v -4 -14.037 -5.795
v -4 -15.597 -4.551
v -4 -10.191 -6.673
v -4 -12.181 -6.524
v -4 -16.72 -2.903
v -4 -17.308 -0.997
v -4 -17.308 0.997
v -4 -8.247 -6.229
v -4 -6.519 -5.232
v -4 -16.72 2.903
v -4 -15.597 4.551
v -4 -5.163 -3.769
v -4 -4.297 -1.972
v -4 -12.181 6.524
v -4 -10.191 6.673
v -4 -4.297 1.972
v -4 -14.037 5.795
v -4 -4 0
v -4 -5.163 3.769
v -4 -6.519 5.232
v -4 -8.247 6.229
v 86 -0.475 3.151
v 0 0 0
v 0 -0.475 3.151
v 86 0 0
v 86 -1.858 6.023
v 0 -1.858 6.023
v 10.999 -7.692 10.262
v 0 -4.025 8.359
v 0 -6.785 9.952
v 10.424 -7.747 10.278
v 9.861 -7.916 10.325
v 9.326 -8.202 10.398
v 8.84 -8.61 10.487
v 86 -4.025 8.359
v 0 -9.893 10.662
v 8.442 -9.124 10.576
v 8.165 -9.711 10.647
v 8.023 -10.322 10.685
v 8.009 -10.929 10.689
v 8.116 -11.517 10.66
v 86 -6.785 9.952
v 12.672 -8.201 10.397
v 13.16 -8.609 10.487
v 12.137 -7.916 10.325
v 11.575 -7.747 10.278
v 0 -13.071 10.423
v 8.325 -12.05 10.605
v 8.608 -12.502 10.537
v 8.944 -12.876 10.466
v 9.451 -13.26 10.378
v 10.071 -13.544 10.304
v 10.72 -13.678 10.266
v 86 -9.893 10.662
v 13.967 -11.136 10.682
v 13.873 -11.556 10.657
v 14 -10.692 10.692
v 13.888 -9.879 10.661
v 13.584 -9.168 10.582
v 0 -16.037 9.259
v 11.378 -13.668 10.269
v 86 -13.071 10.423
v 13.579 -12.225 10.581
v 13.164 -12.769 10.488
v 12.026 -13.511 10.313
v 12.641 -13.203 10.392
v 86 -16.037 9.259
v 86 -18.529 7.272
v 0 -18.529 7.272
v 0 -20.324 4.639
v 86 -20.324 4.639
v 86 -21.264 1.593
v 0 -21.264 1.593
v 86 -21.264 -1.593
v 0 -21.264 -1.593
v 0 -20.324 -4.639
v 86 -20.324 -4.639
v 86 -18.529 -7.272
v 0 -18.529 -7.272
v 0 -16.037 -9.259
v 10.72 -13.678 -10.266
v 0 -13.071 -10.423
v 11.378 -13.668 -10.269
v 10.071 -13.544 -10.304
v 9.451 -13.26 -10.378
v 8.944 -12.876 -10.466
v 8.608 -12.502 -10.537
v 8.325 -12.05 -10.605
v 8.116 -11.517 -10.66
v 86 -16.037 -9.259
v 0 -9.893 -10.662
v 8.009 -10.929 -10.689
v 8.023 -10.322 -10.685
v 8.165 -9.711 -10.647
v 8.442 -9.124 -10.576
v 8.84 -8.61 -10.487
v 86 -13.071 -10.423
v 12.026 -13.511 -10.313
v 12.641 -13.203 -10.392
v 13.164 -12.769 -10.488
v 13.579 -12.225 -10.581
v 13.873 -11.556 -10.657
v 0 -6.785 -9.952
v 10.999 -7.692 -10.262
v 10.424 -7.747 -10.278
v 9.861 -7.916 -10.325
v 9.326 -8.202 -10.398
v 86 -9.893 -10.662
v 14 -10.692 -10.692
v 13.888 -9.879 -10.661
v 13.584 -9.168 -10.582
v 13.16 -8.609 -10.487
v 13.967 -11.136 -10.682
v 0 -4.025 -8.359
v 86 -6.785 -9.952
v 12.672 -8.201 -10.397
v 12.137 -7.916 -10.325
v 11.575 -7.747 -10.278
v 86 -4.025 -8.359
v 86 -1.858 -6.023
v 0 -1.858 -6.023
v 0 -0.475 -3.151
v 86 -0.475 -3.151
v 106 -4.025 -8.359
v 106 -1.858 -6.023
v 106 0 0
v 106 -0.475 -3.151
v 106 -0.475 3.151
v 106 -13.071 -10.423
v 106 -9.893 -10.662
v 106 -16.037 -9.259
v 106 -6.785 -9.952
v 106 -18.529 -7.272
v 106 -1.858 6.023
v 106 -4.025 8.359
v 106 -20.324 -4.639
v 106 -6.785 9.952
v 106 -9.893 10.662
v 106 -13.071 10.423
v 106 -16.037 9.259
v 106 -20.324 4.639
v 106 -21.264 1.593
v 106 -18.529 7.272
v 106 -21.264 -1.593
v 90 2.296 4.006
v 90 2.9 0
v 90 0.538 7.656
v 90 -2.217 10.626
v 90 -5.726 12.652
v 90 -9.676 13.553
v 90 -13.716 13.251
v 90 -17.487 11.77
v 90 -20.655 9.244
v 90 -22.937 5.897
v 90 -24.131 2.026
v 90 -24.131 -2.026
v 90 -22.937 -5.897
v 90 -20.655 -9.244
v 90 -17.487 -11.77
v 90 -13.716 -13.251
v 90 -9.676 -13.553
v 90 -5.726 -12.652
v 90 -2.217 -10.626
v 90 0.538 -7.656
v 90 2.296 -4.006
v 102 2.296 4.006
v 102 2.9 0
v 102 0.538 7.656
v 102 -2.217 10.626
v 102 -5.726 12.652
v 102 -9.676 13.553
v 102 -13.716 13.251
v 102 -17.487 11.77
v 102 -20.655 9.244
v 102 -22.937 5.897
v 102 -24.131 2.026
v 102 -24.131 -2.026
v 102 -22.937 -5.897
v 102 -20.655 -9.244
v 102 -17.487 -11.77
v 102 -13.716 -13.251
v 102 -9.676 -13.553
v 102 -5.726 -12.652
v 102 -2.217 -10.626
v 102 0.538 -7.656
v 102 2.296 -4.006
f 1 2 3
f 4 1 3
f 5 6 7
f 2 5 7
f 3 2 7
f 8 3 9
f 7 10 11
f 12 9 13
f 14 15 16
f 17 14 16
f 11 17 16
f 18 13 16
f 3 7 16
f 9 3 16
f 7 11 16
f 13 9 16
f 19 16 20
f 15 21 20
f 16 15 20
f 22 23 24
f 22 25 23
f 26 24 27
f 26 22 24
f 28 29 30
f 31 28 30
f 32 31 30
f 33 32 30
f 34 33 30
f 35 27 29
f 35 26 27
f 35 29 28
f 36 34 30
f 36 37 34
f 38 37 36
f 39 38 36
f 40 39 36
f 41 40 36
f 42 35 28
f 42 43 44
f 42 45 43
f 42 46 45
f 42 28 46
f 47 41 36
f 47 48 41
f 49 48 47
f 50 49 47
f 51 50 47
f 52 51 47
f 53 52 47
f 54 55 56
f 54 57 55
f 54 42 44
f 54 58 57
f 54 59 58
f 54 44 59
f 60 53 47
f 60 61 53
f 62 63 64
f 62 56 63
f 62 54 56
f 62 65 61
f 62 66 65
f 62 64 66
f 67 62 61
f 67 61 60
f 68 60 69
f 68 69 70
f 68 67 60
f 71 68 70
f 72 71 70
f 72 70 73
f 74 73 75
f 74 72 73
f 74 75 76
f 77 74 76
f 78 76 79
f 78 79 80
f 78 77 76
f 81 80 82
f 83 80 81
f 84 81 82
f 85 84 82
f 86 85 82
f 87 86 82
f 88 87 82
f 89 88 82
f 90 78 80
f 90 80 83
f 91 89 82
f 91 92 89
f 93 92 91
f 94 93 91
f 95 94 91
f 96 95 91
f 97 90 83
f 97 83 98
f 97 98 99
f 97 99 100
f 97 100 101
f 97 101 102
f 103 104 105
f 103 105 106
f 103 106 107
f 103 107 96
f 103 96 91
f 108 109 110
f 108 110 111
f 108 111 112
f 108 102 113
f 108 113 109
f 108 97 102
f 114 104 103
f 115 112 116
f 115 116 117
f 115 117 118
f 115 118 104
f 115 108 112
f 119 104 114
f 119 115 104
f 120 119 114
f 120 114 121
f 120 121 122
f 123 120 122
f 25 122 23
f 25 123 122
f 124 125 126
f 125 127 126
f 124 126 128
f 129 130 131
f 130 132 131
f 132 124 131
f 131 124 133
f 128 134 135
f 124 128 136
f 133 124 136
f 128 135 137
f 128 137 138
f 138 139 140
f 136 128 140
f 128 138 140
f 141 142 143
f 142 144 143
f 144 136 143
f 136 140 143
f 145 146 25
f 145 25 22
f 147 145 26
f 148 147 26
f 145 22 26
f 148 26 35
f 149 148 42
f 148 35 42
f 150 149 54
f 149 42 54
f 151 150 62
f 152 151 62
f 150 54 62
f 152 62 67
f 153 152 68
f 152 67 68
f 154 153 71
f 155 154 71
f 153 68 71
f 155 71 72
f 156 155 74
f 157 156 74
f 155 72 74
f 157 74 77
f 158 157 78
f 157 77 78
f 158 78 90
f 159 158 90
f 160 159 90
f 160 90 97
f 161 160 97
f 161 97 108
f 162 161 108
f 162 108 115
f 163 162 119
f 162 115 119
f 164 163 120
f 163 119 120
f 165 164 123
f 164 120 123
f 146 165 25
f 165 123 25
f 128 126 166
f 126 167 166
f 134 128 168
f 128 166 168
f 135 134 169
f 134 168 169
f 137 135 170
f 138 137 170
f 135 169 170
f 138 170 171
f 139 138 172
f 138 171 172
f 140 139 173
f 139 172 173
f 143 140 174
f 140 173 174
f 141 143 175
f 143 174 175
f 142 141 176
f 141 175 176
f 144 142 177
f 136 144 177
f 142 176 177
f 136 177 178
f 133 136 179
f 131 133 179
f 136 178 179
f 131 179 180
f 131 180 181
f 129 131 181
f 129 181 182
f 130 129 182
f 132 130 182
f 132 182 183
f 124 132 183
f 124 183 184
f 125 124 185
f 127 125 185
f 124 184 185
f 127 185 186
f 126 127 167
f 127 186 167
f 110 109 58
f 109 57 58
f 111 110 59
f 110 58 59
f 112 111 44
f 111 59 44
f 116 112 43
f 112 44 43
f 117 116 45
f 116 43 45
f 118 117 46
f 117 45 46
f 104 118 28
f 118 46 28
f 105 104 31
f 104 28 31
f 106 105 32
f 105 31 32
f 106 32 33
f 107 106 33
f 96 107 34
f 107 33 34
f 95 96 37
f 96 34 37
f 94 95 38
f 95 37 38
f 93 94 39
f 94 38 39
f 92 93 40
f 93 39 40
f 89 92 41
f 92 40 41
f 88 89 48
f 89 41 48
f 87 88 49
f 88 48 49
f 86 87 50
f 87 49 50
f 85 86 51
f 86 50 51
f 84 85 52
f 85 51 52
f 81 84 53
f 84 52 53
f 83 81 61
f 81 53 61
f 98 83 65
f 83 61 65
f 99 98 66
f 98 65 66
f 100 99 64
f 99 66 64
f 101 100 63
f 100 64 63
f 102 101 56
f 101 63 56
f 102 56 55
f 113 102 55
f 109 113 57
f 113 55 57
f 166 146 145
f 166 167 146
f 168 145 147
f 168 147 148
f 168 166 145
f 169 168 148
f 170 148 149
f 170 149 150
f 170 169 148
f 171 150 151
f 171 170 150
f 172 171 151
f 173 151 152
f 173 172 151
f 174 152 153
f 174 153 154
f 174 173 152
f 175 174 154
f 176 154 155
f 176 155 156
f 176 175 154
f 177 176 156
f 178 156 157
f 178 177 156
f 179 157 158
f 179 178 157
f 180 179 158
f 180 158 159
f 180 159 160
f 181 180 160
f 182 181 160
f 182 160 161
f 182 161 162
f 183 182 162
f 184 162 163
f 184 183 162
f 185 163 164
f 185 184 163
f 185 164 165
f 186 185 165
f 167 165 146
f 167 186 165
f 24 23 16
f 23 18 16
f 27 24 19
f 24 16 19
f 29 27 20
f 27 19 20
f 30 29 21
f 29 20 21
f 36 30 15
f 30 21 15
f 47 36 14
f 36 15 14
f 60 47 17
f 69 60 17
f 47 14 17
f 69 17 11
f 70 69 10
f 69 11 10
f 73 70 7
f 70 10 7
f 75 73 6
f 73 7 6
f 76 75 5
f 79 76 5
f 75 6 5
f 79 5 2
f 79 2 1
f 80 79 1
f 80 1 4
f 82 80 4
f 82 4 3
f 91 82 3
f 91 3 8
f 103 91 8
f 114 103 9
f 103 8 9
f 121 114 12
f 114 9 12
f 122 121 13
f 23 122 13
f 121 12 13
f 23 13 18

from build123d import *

# Parameters (mm, degrees)
CROQUIS1_W                 = 86
CROQUIS1_H                 = 10.691540382
CROQUIS1_W_2               = 12
CROQUIS1_H_2               = 13.591389859
CROQUIS2_R                 = 3
CORTAR_EXTRUIR1_DEPTH      = 14.591389858
CORTAR_EXTRUIR1_DEPTH_BACK = 14.591389858


with BuildPart() as part:
    # Croquis1 → Revolución3 (revolve)
    with BuildSketch(Plane.XY):
        with Locations((43, -5.345770191)):
            Rectangle(CROQUIS1_W, CROQUIS1_H)
        Polygon((0, -10.691540382), (0, 0), (-4, -4), (-4, -10.691540382), align=None)
        with Locations((96, -3.895845453)):
            Rectangle(CROQUIS1_W_2, CROQUIS1_H_2)
        Polygon((90, 2.899849477), (86, 0), (86, -10.691540382), (90, -10.691540382), align=None)
        Polygon((106, 0), (102, 2.899849477), (102, -10.691540382), (106, -10.691540382), align=None)
    revolve(axis=Axis((-4, -10.691540382, 0), (1, 0, 0)))

    # Croquis2 → Cortar-Extruir1 (cut, two sides)
    with BuildSketch(Plane.XY) as cortar_extruir1_sk:
        with Locations((11, -10.691540382)):
            Circle(CROQUIS2_R)
    extrude(amount=CORTAR_EXTRUIR1_DEPTH, mode=Mode.SUBTRACT)
    extrude(cortar_extruir1_sk.sketch, amount=-CORTAR_EXTRUIR1_DEPTH_BACK, mode=Mode.SUBTRACT)


solid = part.part
